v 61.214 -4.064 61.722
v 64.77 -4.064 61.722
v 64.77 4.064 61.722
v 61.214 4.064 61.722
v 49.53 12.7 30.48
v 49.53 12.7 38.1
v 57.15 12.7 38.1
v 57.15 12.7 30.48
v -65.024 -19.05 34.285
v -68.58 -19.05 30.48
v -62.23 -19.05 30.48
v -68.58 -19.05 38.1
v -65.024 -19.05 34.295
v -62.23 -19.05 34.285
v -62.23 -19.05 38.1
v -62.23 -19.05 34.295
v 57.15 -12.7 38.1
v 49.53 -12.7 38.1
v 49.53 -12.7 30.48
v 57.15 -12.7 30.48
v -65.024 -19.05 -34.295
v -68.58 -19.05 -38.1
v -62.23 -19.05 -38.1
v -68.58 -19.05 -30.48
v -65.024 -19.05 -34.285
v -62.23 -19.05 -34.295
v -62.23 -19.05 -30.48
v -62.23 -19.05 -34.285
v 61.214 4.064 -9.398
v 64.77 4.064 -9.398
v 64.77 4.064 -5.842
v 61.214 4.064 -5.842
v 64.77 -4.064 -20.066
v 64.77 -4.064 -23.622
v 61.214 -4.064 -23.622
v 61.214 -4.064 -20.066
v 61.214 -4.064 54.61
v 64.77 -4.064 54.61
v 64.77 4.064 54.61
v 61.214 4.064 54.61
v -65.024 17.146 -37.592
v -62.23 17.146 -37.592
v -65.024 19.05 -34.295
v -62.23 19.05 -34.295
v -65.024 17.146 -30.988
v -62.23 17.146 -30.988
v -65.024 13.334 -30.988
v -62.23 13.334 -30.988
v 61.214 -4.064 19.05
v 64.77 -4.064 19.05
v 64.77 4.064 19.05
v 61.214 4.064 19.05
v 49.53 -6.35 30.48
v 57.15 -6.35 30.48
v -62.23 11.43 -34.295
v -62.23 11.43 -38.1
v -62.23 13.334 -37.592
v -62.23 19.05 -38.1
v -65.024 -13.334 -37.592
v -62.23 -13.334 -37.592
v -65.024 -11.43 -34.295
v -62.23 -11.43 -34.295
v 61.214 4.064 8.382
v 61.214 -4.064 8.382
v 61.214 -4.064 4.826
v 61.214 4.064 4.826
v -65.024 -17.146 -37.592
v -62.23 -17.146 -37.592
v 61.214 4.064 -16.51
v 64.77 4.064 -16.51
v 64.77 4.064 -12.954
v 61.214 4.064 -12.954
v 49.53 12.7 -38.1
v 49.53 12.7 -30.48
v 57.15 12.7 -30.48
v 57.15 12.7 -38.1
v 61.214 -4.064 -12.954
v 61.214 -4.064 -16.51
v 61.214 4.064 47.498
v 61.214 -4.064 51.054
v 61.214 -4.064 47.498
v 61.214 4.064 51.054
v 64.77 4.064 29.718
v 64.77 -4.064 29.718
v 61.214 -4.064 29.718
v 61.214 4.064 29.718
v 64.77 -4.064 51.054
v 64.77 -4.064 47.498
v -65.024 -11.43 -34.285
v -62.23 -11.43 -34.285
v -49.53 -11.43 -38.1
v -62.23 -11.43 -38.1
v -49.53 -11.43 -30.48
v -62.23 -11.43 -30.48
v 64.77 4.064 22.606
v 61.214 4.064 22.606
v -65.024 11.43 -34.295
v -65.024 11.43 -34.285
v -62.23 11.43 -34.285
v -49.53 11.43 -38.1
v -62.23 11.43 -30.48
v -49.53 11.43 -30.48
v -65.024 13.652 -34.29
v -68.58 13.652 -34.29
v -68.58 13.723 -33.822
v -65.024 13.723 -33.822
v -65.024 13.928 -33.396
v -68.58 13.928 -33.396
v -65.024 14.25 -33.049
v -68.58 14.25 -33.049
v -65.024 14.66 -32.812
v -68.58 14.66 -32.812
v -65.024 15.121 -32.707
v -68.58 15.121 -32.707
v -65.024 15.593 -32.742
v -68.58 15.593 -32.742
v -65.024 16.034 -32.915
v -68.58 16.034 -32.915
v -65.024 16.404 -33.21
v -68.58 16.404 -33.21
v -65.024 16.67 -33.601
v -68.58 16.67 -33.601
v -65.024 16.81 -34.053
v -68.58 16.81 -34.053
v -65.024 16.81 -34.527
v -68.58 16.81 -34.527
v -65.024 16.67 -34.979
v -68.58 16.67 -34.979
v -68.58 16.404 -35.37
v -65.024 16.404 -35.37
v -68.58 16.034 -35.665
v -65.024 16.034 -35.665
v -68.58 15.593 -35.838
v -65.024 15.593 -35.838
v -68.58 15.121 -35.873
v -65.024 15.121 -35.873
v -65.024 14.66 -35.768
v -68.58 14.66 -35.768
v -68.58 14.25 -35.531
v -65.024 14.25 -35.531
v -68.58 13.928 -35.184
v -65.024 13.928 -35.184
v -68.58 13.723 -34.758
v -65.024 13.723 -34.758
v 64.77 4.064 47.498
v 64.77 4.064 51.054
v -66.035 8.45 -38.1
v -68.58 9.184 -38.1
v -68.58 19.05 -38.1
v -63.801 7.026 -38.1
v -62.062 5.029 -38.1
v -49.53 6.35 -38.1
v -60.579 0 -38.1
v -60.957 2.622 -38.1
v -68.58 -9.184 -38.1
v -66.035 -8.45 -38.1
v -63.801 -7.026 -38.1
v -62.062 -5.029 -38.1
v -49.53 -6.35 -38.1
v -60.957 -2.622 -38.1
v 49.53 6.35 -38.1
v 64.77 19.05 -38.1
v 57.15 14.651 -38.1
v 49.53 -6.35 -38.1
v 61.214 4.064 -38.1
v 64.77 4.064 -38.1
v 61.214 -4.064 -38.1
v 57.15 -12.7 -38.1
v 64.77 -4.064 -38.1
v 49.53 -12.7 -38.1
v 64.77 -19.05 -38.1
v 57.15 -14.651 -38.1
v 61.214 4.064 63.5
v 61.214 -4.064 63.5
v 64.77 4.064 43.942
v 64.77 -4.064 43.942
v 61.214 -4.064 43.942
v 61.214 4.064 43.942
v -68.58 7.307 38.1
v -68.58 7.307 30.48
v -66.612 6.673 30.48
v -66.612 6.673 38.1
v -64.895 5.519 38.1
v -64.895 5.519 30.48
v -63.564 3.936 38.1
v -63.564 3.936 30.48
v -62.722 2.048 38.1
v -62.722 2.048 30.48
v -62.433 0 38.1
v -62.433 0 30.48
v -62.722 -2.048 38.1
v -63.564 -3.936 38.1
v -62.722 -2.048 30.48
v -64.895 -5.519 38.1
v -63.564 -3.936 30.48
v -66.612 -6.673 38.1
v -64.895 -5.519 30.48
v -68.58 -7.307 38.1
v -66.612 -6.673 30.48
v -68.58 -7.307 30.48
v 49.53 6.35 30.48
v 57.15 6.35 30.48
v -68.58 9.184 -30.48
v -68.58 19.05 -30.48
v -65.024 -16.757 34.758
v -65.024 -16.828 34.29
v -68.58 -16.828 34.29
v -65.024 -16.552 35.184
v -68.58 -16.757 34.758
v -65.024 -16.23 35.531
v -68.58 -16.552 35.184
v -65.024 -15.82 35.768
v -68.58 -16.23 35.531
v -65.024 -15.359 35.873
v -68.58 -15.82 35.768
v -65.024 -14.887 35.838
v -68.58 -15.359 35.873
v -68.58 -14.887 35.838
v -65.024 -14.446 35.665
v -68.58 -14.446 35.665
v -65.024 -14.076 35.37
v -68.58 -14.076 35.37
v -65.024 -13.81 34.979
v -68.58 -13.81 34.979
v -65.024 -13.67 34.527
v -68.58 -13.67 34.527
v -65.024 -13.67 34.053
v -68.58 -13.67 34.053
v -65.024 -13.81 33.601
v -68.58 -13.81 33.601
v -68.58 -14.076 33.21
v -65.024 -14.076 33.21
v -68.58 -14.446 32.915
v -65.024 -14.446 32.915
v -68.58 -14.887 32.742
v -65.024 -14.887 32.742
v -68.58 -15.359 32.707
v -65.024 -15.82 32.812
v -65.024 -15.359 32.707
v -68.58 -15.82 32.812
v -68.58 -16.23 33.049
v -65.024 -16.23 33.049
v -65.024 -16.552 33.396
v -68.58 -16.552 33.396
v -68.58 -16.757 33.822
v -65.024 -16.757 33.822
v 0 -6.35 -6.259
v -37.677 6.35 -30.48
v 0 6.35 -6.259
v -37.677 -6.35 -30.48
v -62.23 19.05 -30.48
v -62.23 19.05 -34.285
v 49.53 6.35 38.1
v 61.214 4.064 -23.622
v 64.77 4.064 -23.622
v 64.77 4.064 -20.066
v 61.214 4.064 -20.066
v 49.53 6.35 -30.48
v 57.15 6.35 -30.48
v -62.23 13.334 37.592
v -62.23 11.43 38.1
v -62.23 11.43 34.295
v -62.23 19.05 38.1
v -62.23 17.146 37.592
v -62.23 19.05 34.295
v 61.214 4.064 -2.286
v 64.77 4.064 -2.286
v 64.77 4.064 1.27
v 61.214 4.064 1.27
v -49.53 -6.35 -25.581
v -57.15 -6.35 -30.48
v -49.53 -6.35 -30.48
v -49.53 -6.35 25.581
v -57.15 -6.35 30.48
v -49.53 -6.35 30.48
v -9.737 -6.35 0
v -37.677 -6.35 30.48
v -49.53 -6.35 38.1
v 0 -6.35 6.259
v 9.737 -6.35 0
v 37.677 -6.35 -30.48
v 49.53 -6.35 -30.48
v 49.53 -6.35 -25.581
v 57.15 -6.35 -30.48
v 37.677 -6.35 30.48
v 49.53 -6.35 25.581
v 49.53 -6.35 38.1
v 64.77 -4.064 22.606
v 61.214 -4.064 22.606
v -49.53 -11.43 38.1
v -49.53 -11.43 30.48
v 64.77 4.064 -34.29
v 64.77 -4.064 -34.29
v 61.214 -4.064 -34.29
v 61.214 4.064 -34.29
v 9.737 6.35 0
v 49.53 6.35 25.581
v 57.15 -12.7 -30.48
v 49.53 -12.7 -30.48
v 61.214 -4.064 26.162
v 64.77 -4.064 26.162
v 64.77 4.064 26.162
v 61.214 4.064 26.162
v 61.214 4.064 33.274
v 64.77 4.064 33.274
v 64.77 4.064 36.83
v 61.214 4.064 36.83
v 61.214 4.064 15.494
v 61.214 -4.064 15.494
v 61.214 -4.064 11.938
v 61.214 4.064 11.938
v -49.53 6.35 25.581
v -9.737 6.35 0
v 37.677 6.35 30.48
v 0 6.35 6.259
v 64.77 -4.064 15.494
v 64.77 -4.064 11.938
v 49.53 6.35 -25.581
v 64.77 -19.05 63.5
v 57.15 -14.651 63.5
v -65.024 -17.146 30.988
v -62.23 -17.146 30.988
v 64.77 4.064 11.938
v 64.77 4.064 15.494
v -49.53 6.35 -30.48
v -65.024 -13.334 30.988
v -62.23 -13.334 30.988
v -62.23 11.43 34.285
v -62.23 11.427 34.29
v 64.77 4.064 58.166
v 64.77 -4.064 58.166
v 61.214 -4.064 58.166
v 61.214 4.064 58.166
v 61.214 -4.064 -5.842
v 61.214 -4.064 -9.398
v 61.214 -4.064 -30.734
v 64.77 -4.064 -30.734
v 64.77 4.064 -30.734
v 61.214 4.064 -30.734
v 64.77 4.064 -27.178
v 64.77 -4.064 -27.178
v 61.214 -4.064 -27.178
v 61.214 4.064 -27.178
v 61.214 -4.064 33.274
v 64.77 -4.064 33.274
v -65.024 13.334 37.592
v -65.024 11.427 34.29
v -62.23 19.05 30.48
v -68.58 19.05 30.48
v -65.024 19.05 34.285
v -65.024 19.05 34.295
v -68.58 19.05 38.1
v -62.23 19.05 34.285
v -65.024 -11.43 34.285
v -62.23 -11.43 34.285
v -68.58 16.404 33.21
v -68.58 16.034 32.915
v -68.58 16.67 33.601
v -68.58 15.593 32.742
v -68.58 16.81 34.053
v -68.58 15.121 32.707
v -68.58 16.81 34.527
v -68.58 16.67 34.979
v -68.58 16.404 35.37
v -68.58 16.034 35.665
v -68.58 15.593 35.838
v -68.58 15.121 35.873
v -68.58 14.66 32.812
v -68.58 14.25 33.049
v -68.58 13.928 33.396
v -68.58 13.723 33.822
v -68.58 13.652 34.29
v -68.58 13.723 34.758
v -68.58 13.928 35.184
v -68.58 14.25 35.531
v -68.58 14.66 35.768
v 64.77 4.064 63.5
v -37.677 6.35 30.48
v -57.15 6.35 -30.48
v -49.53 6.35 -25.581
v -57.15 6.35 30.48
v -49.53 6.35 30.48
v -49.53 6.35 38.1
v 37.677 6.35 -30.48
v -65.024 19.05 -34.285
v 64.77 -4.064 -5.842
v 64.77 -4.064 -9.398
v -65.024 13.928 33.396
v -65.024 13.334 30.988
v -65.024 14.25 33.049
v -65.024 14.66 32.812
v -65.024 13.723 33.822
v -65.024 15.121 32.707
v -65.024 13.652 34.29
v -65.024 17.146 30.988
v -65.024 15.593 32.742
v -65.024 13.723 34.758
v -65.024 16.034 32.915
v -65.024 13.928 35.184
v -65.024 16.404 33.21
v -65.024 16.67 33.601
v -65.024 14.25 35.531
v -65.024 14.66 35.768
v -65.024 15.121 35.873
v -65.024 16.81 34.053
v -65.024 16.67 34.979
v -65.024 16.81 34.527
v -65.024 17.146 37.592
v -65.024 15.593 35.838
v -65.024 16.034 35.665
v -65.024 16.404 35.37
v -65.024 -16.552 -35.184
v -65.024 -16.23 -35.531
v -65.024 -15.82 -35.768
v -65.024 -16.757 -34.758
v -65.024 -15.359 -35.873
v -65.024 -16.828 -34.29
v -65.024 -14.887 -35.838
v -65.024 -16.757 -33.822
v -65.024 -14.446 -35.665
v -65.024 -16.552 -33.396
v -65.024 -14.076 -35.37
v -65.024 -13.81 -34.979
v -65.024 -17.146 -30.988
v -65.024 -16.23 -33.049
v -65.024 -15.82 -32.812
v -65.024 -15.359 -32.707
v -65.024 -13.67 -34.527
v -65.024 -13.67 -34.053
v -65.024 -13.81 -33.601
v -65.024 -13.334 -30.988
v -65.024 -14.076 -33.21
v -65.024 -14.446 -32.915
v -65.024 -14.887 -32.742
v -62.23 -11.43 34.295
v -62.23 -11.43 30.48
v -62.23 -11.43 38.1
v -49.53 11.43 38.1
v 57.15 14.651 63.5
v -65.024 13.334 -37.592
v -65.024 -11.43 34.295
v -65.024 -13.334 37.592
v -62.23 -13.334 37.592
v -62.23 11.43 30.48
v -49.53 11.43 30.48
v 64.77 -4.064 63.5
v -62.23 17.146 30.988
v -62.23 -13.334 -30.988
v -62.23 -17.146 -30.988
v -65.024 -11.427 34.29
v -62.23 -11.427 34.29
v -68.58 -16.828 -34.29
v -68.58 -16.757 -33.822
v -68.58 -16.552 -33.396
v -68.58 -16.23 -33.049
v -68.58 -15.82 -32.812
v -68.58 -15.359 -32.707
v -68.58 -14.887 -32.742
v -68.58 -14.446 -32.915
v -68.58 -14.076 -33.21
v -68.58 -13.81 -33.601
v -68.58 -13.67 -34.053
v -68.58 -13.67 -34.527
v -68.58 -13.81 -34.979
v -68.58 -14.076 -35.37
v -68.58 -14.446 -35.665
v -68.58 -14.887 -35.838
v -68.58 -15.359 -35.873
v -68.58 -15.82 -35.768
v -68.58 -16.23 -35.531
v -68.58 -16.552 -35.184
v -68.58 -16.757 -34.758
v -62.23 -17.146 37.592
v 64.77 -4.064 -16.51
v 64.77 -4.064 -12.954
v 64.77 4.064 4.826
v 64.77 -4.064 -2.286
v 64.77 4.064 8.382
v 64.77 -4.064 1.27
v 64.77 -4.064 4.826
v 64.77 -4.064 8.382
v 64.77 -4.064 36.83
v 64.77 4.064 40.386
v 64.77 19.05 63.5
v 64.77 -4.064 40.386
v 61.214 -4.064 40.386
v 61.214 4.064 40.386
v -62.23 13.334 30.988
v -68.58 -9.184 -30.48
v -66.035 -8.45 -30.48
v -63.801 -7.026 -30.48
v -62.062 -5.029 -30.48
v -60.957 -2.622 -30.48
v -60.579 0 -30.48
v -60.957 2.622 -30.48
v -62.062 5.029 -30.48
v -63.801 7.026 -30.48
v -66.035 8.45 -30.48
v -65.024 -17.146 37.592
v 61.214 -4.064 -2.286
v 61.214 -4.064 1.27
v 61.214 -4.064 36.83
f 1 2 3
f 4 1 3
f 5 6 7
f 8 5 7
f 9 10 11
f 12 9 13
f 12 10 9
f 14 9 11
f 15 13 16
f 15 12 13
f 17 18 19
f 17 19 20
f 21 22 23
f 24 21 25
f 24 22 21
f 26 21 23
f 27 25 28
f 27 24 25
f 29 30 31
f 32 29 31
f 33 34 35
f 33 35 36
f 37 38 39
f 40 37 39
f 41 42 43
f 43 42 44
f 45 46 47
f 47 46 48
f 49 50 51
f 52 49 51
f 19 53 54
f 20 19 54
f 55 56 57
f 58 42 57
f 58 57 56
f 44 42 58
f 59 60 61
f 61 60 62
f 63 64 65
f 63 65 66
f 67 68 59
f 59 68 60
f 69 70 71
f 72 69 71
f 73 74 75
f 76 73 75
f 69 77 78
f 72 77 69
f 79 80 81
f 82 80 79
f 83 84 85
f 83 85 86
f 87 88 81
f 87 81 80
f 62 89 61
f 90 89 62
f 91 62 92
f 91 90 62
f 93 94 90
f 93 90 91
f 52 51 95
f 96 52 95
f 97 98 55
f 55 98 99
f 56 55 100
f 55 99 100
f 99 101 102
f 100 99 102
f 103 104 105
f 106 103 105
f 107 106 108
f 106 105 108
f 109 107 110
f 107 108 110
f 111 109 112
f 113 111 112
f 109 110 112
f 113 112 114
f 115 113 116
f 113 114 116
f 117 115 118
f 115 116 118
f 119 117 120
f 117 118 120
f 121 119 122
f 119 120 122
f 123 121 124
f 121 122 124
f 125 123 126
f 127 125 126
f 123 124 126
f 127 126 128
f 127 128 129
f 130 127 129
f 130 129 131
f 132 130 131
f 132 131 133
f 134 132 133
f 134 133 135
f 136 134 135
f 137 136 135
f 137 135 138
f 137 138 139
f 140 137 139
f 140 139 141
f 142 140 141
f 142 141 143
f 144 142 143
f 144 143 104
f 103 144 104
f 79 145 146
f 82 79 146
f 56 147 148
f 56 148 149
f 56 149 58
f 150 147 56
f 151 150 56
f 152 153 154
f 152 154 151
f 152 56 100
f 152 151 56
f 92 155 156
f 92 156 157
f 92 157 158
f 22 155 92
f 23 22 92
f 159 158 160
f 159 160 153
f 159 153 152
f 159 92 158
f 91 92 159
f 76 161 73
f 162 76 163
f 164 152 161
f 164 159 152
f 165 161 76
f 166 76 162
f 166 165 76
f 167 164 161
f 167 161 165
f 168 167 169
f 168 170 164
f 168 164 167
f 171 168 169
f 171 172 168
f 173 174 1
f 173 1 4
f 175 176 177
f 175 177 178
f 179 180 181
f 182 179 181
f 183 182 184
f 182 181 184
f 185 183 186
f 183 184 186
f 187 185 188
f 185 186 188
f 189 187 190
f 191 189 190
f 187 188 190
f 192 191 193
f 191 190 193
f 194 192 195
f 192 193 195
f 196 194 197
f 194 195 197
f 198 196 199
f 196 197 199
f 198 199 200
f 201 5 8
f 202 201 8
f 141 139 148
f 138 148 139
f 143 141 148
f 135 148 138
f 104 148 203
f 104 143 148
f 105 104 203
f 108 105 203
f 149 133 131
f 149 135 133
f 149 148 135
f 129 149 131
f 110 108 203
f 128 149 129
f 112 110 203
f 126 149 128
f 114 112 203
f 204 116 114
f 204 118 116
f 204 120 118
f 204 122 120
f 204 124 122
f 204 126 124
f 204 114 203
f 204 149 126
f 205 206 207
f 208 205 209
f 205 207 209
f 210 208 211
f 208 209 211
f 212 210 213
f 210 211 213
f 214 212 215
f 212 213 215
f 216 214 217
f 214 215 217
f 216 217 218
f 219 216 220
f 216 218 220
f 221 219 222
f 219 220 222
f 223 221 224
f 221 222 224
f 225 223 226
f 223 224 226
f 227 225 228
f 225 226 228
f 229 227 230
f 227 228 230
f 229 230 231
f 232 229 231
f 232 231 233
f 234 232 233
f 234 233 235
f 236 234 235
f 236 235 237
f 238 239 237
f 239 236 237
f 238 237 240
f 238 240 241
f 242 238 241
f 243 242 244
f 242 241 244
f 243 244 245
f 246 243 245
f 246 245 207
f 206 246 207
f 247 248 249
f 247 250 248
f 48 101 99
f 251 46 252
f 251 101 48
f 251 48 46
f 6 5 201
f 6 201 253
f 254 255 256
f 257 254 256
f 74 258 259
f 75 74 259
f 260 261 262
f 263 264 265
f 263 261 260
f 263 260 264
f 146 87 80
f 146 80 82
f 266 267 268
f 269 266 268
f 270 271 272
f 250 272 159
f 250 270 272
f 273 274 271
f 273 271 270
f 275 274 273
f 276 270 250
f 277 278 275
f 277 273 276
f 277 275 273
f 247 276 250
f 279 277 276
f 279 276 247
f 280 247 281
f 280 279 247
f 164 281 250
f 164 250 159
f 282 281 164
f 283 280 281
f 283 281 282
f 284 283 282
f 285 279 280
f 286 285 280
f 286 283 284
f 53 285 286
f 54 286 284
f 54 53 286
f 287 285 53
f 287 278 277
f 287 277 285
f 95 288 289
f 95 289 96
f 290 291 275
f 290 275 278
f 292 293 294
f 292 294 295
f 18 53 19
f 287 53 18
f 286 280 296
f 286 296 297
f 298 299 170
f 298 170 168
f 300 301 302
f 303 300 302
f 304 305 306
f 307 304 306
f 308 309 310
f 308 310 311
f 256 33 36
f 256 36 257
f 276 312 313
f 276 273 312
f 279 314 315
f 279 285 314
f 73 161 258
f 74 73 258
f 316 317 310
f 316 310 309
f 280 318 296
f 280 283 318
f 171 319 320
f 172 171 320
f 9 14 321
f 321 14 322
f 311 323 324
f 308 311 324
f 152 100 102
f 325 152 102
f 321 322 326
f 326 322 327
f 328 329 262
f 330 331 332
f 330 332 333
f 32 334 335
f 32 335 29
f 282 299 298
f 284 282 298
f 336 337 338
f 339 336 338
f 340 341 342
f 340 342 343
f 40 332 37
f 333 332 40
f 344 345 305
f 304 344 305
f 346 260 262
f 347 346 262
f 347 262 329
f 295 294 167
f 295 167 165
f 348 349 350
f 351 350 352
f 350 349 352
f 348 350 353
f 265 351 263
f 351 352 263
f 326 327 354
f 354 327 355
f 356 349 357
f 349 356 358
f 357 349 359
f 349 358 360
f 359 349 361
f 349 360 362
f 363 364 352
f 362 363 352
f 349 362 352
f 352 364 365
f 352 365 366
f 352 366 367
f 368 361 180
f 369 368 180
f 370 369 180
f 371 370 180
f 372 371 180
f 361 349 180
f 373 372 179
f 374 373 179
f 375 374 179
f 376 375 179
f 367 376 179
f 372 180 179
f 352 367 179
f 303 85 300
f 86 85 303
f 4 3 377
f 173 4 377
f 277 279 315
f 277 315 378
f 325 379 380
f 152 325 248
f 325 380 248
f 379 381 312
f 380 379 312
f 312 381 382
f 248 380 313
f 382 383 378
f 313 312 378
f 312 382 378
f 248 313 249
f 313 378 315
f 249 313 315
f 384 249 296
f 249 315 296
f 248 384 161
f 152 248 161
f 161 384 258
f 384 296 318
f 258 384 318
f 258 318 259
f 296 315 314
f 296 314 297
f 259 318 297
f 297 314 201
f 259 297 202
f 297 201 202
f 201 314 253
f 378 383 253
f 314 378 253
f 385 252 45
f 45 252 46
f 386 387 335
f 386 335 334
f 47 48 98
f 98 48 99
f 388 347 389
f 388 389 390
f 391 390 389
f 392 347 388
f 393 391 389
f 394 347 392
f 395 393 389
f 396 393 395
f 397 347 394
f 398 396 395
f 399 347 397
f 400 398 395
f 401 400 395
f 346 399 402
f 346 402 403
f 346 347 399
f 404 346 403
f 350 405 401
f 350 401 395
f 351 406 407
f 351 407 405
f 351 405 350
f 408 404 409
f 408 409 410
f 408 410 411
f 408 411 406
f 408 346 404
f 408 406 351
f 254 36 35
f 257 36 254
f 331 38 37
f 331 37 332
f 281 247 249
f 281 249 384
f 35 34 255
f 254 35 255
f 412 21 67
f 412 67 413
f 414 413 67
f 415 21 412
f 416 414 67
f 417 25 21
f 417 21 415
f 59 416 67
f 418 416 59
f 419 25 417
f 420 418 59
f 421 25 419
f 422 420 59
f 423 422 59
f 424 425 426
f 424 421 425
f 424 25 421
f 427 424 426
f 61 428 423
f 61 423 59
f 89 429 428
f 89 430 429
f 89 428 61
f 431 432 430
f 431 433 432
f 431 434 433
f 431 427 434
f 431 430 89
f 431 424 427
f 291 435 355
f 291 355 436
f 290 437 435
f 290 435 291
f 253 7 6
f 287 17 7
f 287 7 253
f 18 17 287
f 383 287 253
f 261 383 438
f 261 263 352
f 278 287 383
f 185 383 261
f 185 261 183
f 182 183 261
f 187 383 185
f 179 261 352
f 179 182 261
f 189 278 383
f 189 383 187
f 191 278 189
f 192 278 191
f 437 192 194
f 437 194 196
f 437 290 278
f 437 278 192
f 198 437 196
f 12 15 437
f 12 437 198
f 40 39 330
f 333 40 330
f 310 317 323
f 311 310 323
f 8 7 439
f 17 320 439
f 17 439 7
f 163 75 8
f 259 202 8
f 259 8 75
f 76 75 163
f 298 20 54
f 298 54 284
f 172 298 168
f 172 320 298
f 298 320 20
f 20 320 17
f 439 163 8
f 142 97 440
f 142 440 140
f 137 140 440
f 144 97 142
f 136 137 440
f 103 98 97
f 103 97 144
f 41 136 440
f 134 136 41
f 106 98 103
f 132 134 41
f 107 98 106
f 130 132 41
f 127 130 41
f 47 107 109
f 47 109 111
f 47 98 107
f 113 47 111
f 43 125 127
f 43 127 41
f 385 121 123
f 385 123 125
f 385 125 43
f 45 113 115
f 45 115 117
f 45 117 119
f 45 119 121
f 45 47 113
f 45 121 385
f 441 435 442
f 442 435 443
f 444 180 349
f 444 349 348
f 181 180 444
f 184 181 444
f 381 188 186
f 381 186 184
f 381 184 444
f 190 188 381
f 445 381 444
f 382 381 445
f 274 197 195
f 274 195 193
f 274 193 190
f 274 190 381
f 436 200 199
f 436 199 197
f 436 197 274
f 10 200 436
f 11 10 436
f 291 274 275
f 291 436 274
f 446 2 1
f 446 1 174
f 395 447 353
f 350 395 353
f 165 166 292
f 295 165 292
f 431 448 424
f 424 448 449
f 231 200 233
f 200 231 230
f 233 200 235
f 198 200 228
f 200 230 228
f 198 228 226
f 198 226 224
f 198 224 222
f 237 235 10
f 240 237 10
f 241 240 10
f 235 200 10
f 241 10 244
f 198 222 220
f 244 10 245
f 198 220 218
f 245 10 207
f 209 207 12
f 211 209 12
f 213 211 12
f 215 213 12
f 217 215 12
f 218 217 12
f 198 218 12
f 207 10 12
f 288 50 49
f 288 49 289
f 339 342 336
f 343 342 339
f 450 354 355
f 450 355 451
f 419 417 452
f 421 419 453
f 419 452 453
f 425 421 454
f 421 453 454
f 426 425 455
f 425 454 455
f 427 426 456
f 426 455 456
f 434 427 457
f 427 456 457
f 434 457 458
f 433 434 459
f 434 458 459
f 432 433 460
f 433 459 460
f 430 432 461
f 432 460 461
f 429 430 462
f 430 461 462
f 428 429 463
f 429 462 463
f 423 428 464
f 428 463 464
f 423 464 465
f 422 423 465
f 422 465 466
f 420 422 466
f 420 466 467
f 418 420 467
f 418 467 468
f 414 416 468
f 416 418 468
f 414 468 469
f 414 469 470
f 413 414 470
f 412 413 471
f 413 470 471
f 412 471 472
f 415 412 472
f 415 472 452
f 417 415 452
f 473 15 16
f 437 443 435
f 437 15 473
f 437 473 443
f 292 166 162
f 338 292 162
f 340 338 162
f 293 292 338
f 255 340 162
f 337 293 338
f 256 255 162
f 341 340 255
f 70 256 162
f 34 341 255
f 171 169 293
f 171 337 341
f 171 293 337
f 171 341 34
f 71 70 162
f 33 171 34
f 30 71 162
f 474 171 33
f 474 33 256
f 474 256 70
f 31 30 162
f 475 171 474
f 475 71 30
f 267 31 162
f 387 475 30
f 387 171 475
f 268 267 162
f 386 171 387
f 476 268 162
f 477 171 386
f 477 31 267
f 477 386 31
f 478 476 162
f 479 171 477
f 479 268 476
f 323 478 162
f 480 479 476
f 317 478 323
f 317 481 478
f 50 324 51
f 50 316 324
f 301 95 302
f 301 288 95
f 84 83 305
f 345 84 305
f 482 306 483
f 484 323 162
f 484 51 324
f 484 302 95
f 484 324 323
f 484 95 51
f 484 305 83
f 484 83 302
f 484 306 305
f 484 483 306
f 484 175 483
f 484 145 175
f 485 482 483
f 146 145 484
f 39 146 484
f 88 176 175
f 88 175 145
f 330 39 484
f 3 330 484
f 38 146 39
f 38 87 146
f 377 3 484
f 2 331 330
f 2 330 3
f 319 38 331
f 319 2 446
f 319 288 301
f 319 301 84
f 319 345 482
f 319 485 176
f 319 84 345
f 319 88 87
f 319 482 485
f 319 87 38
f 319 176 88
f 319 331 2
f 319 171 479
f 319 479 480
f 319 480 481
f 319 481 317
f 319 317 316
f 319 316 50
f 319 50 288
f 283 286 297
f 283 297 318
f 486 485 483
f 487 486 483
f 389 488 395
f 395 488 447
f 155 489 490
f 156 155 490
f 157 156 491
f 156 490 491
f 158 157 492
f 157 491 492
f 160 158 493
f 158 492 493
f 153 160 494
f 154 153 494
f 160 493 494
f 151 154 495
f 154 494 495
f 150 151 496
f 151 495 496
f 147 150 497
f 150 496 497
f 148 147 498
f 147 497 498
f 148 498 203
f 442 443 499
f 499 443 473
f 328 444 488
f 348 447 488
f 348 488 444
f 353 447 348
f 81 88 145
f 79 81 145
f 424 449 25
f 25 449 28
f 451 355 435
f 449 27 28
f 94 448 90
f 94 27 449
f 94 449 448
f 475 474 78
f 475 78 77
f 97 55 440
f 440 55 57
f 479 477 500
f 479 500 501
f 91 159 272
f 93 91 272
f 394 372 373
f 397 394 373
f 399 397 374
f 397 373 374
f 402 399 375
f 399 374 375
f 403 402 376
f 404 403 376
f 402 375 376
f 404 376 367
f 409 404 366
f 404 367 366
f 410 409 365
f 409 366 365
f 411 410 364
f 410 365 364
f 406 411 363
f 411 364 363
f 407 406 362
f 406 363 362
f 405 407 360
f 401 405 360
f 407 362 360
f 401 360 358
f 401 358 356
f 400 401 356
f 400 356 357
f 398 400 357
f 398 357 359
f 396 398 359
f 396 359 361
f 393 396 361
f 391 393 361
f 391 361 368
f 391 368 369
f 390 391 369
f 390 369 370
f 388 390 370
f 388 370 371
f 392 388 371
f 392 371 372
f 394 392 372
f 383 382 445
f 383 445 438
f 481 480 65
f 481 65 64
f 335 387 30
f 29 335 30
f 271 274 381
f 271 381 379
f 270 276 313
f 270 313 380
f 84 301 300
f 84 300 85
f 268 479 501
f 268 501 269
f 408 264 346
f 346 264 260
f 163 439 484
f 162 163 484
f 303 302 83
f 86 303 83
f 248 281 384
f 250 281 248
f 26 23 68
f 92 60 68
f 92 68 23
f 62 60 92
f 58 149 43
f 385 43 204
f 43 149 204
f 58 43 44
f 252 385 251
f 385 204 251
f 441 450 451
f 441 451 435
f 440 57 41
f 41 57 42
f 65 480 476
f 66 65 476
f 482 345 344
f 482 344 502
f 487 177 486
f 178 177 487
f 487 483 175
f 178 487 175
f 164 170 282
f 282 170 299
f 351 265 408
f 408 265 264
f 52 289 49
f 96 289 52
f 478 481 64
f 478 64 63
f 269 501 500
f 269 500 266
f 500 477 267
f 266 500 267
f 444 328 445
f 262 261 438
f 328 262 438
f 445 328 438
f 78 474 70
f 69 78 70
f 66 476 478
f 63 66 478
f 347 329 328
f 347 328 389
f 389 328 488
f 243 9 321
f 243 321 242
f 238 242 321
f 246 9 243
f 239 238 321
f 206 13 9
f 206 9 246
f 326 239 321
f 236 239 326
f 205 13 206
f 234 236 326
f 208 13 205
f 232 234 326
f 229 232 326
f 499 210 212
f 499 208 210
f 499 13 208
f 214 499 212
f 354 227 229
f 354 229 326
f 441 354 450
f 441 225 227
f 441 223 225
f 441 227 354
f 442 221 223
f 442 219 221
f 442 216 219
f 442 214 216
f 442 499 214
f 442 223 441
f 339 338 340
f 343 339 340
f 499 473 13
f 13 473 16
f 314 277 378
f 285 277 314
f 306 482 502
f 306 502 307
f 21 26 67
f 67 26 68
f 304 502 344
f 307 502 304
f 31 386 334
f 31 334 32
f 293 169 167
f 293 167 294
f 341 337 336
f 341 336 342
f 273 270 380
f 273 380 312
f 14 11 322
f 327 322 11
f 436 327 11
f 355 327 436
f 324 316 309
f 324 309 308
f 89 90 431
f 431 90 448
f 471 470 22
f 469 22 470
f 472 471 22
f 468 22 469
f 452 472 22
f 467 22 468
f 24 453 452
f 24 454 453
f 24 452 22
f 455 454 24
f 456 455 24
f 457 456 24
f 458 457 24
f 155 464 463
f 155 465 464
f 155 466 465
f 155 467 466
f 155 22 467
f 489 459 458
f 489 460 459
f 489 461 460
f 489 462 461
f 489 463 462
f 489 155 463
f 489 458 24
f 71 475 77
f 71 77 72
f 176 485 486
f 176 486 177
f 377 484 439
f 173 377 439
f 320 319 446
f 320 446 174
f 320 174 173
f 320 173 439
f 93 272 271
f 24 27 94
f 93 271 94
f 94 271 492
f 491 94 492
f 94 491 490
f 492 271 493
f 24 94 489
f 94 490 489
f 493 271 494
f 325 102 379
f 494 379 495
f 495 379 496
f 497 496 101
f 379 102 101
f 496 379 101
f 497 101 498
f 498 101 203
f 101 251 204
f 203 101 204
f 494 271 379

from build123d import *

# Parameters (mm, degrees)
F1_DEPTH  = 6.35
F0_W      = 11.43
F0_H      = 7.62
F0_W_2    = 7.62
F2_DEPTH  = 19.05
F3_DEPTH  = 19.05
F4_DEPTH  = 12.7
F6_DEPTH  = 127
F8_D      = 18.542
F8_DEPTH  = 7.62
F8_TIP    = 5.570578799
F10_D     = 14.8336
F10_DEPTH = 7.62
F10_TIP   = 4.4564630392
F11_W     = 8.128
F11_H     = 1.778
F11_H_2   = 3.556
F11_H_3   = 3.81
F12_DEPTH = 3.556
F9_W      = 12.7
F9_H      = 7.62
F15_DEPTH = 76.201
F13_R     = 1.5875
F14_R     = 1.5875
F16_DEPTH = 38.1
F18_R     = 1.5875
F20_R     = 1.5875
F19_R     = 1.5875
F21_DEPTH = 2.794
F22_DEPTH = 2.794


# Not quite as in the source:
# - a feature names something its author has since deleted; it is built from what else it names


with BuildPart() as f1:
    # F0 (on Front) → F1 (new body, symmetric)
    with BuildSketch(Plane.XZ):
        Polygon((49.53, 38.1), (-49.53, 38.1), (-37.6766666667, 30.48), (37.6766666667, 30.48), align=None)
        Polygon((-37.6766666667, -30.48), (-49.53, -38.1), (49.53, -38.1), (37.6766666667, -30.48), align=None)
        Polygon((-49.53, 25.5814285714), (-57.15, 30.48), (-57.15, -30.48), (-49.53, -25.5814285714), align=None)
        Polygon((-49.53, 30.48), (-57.15, 30.48), (-49.53, 25.5814285714), align=None)
        Polygon((-37.6766666667, 30.48), (-49.53, 38.1), (-49.53, 30.48), align=None)
        Polygon((49.53, 30.48), (49.53, 38.1), (37.6766666667, 30.48), align=None)
        Polygon((37.6766666667, -30.48), (49.53, -38.1), (49.53, -30.48), align=None)
        Polygon((-37.6766666667, -30.48), (-49.53, -30.48), (-49.53, -38.1), align=None)
        Polygon((-49.53, -25.5814285714), (-57.15, -30.48), (-49.53, -30.48), align=None)
        Polygon((57.15, -30.48), (57.15, 30.48), (49.53, 25.5814285714), (49.53, -25.5814285714), align=None)
        Polygon((49.53, -30.48), (57.15, -30.48), (49.53, -25.5814285714), align=None)
        Polygon((57.15, 30.48), (49.53, 30.48), (49.53, 25.5814285714), align=None)
        Polygon((49.53, 25.5814285714), (49.53, 30.48), (37.6766666667, 30.48), (0, 6.2592857143), (9.7366666667, 0), align=None)
        Polygon((49.53, -25.5814285714), (9.7366666667, 0), (0, -6.2592857143), (37.6766666667, -30.48), (49.53, -30.48), align=None)
        Polygon((-49.53, -25.5814285714), (-49.53, -30.48), (-37.6766666667, -30.48), (0, -6.2592857143), (-9.7366666667, 0), align=None)
        Polygon((-37.6766666667, 30.48), (-49.53, 30.48), (-49.53, 25.5814285714), (-9.7366666667, 0), (0, 6.2592857143), align=None)
        Polygon((9.7366666667, 0), (0, 6.2592857143), (-9.7366666667, 0), (0, -6.2592857143), align=None)
    extrude(amount=F1_DEPTH, both=True)

    # F0 (on Front) → F2 (join, symmetric)
    with BuildSketch(Plane.XZ):
        with Locations((-62.865, -34.29)):
            Rectangle(F0_W, F0_H)
        with Locations((-62.865, 34.29)):
            Rectangle(F0_W, F0_H)
        with Locations((-53.34, -34.29)):
            Rectangle(F0_W_2, F0_H)
        with Locations((-53.34, 34.29)):
            Rectangle(F0_W_2, F0_H)
    extrude(amount=F2_DEPTH, both=True)

    # F0 (on Front) → F3 (join, symmetric)
    with BuildSketch(Plane.XZ):
        Polygon((57.15, 63.5), (57.15, 38.1), (57.15, 30.48), (57.15, -30.48), (57.15, -38.1), (64.77, -38.1), (64.77, 63.5), align=None)
    extrude(amount=F3_DEPTH, both=True)

    # F0 (on Front) → F4 (join, symmetric)
    with BuildSketch(Plane.XZ):
        with Locations((53.34, 34.29)):
            Rectangle(F0_W_2, F0_H)
        with Locations((53.34, -34.29)):
            Rectangle(F0_W_2, F0_H)
    extrude(amount=F4_DEPTH, both=True)

    # F5 (on face) → F6 (cut)
    with BuildSketch(Plane.XY.offset(63.5)):
        Polygon((57.15, 14.6505909488), (64.77, 19.05), (57.15, 19.05), align=None)
        Polygon((57.15, -19.05), (64.77, -19.05), (57.15, -14.6505909488), align=None)
    extrude(amount=-F6_DEPTH, mode=Mode.SUBTRACT)

    # F8
    with Locations(Plane(origin=(0, 0, -38.1), x_dir=(1, 0, 0), z_dir=(0, 0, -1))):
        with Locations((-69.85, 0)):
            Hole(F8_D / 2, depth=F8_DEPTH)
            with Locations((0, 0, -(F8_DEPTH + F8_TIP / 2))):  # 118° drill point
                Cone(0, F8_D / 2, F8_TIP, mode=Mode.SUBTRACT)

    # F10
    with Locations(Plane.XY.offset(38.1)):
        with Locations((-69.85, 0)):
            Hole(F10_D / 2, depth=F10_DEPTH)
            with Locations((0, 0, -(F10_DEPTH + F10_TIP / 2))):  # 118° drill point
                Cone(0, F10_D / 2, F10_TIP, mode=Mode.SUBTRACT)

    # F11 (on face) → F12 (cut)
    with BuildSketch(Plane.YZ.offset(64.77)):
        with Locations((0, 62.611)):
            Rectangle(F11_W, F11_H)
        with Locations((0, 56.388)):
            Rectangle(F11_W, F11_H_2)
        with Locations((0, 49.276)):
            Rectangle(F11_W, F11_H_2)
        with Locations((0, 42.164)):
            Rectangle(F11_W, F11_H_2)
        with Locations((0, 35.052)):
            Rectangle(F11_W, F11_H_2)
        with Locations((0, 27.94)):
            Rectangle(F11_W, F11_H_2)
        with Locations((0, 20.828)):
            Rectangle(F11_W, F11_H_2)
        with Locations((0, 13.716)):
            Rectangle(F11_W, F11_H_2)
        with Locations((0, 6.604)):
            Rectangle(F11_W, F11_H_2)
        with Locations((0, -0.508)):
            Rectangle(F11_W, F11_H_2)
        with Locations((0, -7.62)):
            Rectangle(F11_W, F11_H_2)
        with Locations((0, -14.732)):
            Rectangle(F11_W, F11_H_2)
        with Locations((0, -21.844)):
            Rectangle(F11_W, F11_H_2)
        with Locations((0, -28.956)):
            Rectangle(F11_W, F11_H_2)
        with Locations((0, -36.195)):
            Rectangle(F11_W, F11_H_3)
    extrude(amount=-F12_DEPTH, mode=Mode.SUBTRACT)

    # F9 (on face) → F15 (cut, through all)
    with BuildSketch(Plane.XY.offset(38.1)):
        with Locations((-55.88, 15.24)):
            Rectangle(F9_W, F9_H)
        with Locations((-55.88, -15.24)):
            Rectangle(F9_W, F9_H)
    extrude(amount=-F15_DEPTH, mode=Mode.SUBTRACT)

    # F13 (on face) + F14 (on face) → F16 (cut)
    with BuildSketch(Plane(origin=(-68.58, 0, 0), x_dir=(0, -1, 0), z_dir=(-1, 0, 0))):
        with Locations((-15.24, 34.29)):
            Circle(F13_R)
        with Locations((15.24, 34.29)):
            Circle(F13_R)
    with BuildSketch(Plane(origin=(-68.58, 0, 0), x_dir=(0, -1, 0), z_dir=(-1, 0, 0))):
        with Locations((15.24, -34.29)):
            Circle(F14_R)
        with Locations((-15.24, -34.29)):
            Circle(F14_R)
    extrude(amount=-F16_DEPTH, mode=Mode.SUBTRACT)

    # F17 (on face) + F18 (on face) + F20 (on face) + F19 (on face) → F21 (cut)
    with BuildSketch(Plane.YZ.offset(-62.23)):
        Polygon((19.0528211777, 34.29), (17.1464105889, 37.592), (13.3335894111, 37.592), (11.4271788223, 34.29), (13.3335894111, 30.988), (17.1464105889, 30.988), align=None)
    with BuildSketch(Plane.YZ.offset(-62.23)):
        Polygon((-11.43, 34.2948864232), (-13.3335894111, 37.592), (-17.1464105889, 37.592), (-19.05, 34.2948864232), (-19.05, 34.2851135768), (-17.1464105889, 30.988), (-13.3335894111, 30.988), (-11.43, 34.2851135768), align=None)
        with Locations((-15.24, 34.29)):
            Circle(F18_R, mode=Mode.SUBTRACT)
    with BuildSketch(Plane.YZ.offset(-62.23)):
        Polygon((-11.43, -34.2851135768), (-13.3335894111, -30.988), (-17.1464105889, -30.988), (-19.05, -34.2851135768), (-19.05, -34.2948864232), (-17.1464105889, -37.592), (-13.3335894111, -37.592), (-11.43, -34.2948864232), align=None)
        with Locations((-15.24, -34.29)):
            Circle(F20_R, mode=Mode.SUBTRACT)
    with BuildSketch(Plane.YZ.offset(-62.23)):
        Polygon((19.05, -34.2851135768), (17.1464105889, -30.988), (13.3335894111, -30.988), (11.43, -34.2851135768), (11.43, -34.2948864232), (13.3335894111, -37.592), (17.1464105889, -37.592), (19.05, -34.2948864232), align=None)
        with Locations((15.24, -34.29)):
            Circle(F19_R, mode=Mode.SUBTRACT)
    extrude(amount=-F21_DEPTH, mode=Mode.SUBTRACT)

    # F18 (on face) → F22 (cut)
    with BuildSketch(Plane.YZ.offset(-62.23)):
        Polygon((-11.4271788223, 34.29), (-13.3335894111, 37.592), (-17.1464105889, 37.592), (-19.0528211777, 34.29), (-17.1464105889, 30.988), (-13.3335894111, 30.988), align=None)
    extrude(amount=-F22_DEPTH, mode=Mode.SUBTRACT)


solid = f1.part
